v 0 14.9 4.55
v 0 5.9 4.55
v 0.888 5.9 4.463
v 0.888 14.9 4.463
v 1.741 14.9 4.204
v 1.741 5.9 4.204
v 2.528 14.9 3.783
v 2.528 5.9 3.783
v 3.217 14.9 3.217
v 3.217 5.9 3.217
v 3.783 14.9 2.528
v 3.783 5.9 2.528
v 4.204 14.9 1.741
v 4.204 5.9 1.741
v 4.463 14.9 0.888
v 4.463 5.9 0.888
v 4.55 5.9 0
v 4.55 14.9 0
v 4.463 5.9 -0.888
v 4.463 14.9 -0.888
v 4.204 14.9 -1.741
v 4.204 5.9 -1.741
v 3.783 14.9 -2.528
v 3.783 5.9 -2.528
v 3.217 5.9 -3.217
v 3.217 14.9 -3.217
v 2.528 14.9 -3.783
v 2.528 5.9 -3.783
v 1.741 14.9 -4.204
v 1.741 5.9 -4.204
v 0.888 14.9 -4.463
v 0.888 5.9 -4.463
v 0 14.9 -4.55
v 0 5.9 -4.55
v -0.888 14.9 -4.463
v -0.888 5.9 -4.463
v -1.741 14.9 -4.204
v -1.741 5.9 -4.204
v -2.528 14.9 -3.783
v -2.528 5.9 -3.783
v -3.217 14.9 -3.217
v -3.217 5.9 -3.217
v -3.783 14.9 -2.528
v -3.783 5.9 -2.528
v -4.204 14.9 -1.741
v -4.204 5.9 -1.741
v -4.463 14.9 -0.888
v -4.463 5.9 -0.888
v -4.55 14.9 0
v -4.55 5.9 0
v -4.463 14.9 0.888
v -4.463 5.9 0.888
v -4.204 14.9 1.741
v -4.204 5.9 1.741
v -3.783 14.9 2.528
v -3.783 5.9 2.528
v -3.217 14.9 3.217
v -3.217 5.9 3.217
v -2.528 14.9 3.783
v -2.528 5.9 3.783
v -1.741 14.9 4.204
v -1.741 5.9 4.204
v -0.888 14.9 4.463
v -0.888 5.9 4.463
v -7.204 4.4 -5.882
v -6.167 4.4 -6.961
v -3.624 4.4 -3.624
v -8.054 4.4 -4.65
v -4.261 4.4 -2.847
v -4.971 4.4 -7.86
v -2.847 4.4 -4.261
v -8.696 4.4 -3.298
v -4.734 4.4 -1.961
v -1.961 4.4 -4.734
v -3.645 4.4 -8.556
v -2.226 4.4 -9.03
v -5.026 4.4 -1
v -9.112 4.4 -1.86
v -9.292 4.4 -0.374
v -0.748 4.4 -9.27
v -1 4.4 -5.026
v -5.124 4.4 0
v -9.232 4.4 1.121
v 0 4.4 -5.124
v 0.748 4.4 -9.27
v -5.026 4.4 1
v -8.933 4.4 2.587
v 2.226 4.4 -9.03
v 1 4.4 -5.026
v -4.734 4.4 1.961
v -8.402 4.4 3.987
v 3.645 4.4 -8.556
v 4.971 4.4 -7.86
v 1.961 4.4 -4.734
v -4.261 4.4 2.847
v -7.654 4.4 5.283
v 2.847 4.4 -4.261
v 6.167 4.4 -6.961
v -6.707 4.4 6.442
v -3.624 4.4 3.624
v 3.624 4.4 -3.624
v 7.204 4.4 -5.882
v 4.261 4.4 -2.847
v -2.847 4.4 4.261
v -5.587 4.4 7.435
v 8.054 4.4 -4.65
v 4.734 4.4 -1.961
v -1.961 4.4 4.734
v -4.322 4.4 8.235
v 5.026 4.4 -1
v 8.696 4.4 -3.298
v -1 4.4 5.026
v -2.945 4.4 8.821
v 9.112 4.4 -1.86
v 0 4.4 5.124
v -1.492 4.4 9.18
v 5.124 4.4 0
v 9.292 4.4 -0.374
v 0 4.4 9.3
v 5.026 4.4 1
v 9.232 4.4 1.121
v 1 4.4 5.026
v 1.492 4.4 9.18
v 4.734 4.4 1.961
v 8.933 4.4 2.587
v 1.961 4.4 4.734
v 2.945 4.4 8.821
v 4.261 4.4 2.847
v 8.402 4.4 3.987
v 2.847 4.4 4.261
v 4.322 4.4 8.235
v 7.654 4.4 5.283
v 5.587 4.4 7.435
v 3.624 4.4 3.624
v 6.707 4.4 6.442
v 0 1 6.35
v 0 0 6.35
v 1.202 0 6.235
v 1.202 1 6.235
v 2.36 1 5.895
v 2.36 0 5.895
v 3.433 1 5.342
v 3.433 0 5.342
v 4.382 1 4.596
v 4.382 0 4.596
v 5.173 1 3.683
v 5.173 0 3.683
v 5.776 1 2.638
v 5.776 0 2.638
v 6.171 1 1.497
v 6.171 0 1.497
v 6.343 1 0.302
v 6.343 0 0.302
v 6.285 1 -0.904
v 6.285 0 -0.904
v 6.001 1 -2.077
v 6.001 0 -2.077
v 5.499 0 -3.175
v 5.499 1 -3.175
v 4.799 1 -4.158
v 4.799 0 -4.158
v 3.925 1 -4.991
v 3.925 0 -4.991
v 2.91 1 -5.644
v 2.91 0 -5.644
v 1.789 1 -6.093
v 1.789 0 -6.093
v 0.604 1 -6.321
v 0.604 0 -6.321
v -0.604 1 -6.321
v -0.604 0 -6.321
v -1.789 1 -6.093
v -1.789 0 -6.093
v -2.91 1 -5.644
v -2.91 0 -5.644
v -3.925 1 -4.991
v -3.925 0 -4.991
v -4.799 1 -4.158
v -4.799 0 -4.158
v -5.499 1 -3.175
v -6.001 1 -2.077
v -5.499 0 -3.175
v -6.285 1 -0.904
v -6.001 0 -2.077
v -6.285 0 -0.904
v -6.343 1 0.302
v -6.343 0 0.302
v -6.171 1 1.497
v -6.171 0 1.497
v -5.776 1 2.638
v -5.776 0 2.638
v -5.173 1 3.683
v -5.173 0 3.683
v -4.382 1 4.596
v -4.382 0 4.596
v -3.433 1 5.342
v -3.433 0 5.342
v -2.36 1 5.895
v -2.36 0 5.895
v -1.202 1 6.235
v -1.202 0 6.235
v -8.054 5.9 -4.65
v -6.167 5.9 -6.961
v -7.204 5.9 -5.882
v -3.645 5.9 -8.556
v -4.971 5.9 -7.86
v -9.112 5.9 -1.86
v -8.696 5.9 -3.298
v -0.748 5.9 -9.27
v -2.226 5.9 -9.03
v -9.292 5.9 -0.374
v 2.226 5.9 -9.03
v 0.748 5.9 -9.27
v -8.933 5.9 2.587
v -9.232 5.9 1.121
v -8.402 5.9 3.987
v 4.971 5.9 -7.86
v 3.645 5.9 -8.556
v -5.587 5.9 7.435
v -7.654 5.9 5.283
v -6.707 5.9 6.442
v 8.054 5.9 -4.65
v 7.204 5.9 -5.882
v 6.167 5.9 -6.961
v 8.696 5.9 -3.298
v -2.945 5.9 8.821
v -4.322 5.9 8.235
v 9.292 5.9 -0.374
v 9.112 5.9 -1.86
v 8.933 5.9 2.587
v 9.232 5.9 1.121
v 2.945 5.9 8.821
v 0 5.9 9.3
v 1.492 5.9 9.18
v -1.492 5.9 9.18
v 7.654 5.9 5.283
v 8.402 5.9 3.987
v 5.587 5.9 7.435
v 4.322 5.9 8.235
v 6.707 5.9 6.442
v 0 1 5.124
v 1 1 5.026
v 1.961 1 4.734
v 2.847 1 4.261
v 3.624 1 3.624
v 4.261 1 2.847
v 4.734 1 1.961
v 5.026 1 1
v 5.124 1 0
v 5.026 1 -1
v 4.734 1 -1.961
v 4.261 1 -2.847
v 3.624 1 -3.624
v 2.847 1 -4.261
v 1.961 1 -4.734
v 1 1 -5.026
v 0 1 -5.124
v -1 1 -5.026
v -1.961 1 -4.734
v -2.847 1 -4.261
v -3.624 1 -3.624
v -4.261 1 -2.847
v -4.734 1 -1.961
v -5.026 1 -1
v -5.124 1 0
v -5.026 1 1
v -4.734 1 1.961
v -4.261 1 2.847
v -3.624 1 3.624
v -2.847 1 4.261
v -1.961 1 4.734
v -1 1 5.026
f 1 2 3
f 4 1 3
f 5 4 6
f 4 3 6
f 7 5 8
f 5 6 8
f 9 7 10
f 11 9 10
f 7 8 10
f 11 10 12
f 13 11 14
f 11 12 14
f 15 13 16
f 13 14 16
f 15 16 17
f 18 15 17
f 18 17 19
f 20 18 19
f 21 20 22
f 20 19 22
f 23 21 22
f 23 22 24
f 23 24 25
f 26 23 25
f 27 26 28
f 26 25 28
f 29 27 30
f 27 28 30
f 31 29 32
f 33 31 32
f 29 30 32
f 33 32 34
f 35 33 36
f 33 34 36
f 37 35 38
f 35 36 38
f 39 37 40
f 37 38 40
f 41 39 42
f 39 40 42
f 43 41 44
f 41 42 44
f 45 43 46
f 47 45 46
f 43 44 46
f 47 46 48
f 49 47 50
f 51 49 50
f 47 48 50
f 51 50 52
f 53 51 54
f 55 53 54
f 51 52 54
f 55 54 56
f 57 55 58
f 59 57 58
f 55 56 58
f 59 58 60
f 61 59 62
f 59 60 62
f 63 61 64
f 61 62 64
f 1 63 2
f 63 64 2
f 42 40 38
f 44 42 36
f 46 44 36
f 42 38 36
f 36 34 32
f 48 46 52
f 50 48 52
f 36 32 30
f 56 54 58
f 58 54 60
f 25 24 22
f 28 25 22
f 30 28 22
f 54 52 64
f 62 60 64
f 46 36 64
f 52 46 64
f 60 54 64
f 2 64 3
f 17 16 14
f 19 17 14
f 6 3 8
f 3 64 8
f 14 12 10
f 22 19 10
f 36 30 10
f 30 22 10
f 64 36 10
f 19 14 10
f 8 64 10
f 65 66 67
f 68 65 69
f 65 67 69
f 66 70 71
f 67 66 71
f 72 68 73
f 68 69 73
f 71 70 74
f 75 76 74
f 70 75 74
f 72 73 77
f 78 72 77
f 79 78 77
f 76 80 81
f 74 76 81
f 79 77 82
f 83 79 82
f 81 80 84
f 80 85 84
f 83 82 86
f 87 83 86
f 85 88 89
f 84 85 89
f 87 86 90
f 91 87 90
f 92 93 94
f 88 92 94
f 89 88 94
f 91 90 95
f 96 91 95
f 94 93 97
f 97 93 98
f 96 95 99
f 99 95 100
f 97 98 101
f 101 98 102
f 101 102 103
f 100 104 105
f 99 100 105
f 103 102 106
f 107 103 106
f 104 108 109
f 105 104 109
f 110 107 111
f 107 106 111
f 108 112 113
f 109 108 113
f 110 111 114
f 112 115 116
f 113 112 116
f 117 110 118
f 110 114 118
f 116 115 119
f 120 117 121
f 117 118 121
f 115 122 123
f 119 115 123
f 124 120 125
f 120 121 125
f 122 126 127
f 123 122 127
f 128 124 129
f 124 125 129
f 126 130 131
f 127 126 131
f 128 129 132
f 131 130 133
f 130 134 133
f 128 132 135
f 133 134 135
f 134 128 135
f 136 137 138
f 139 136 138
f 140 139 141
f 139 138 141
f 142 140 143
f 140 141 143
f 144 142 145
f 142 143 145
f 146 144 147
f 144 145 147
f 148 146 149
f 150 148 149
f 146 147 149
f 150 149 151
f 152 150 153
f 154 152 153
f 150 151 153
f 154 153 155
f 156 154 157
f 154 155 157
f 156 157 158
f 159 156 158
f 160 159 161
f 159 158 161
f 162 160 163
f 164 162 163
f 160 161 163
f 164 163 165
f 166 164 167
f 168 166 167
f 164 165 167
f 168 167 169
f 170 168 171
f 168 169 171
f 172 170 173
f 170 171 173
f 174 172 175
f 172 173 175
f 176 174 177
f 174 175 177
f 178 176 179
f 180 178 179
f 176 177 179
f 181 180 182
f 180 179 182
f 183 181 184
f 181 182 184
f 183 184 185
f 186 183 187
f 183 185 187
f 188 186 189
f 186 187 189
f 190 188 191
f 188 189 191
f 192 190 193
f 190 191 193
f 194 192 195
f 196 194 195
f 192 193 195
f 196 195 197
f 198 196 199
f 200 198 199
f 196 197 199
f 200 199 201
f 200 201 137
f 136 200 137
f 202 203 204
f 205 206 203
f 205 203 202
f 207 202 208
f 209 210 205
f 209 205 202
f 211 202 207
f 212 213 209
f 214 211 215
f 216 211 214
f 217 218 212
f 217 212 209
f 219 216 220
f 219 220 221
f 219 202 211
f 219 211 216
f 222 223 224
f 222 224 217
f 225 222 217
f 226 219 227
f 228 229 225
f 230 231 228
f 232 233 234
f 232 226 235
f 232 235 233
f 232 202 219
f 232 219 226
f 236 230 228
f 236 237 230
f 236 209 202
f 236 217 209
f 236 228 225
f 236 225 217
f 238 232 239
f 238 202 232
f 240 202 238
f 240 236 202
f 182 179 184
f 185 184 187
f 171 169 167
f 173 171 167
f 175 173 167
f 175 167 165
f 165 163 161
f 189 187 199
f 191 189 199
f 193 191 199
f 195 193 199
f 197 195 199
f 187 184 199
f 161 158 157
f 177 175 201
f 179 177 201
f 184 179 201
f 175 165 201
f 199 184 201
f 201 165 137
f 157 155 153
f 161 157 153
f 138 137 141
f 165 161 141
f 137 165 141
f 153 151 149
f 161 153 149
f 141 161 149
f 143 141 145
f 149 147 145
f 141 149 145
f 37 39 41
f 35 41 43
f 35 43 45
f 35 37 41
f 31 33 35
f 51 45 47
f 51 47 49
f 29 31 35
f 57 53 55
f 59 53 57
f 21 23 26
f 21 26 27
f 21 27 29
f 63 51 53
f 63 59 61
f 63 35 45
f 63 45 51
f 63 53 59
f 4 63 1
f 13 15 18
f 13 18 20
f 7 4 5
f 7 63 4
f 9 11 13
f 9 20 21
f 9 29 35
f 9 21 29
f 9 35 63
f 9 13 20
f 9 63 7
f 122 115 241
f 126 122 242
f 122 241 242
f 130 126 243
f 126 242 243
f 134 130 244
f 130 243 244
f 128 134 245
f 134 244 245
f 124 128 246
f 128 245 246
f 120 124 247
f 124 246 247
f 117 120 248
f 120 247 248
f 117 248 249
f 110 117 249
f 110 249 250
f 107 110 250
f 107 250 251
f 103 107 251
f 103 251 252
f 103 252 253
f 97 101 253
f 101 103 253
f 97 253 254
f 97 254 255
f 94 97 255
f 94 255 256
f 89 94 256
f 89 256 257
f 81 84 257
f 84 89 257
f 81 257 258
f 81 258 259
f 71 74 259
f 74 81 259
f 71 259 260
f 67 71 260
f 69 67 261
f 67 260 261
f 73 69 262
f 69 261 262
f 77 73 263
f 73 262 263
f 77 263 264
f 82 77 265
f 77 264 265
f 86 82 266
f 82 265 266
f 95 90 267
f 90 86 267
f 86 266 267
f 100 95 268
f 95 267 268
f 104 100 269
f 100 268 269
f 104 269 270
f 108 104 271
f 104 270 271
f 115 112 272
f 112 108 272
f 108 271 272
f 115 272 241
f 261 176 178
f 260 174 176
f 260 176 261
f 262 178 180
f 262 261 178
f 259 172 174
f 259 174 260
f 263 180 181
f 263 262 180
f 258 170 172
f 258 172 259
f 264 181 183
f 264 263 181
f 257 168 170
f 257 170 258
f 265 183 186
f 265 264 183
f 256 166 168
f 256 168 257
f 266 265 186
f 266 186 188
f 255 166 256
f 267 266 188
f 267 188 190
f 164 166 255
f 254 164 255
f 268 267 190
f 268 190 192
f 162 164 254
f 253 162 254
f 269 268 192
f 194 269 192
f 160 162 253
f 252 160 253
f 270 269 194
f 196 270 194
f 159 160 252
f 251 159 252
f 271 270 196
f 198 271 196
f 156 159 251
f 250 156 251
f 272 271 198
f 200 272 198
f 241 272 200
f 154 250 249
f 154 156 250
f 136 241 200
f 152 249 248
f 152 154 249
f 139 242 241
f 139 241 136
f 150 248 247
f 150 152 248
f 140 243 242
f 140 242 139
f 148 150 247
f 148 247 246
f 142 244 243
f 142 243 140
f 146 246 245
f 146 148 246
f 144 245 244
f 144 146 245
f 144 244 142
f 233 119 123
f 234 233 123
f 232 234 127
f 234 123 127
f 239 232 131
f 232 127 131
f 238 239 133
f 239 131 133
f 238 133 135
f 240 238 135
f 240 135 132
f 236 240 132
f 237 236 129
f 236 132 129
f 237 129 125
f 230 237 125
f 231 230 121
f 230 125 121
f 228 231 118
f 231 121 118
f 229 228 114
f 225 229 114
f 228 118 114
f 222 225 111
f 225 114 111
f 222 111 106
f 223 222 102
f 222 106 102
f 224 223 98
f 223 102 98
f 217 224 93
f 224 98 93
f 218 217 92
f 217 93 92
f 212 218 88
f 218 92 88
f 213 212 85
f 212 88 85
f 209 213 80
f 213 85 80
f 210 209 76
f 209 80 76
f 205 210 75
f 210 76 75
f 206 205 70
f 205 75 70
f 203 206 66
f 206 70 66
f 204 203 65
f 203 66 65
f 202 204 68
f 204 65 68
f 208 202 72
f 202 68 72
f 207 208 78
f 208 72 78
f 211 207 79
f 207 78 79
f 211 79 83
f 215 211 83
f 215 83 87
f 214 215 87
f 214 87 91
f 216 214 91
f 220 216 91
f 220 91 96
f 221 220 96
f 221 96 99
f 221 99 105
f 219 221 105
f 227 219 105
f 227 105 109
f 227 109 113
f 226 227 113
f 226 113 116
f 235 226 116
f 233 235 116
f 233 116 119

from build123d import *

# Parameters (mm, degrees)
SKETCH1_R           = 6.35
BOSS_EXTRUDE1_DEPTH = 1
SKETCH3_R           = 9.3
BOSS_EXTRUDE3_DEPTH = 1.5
SKETCH5_R           = 4.55
BOSS_EXTRUDE4_DEPTH = 9
BOSS_EXTRUDE5_REACH = 21.136
SKETCH2_R           = 5.12445119


with BuildPart() as part:
    # Sketch1 → Boss-Extrude1 (new body)
    with BuildSketch(Plane(origin=(0, 0, 0), x_dir=(1, 0, 0), z_dir=(0, 1, 0))):
        with Locations(Location((0, 0, 0), (0, 0, 270))):
            Circle(SKETCH1_R)
    extrude(amount=BOSS_EXTRUDE1_DEPTH)


with BuildPart() as body_2:
    # Sketch3 → Boss-Extrude3 (new body)
    with BuildSketch(Plane(origin=(0, 4.4, 0), x_dir=(1, 0, 0), z_dir=(0, 1, 0))):
        with Locations(Location((0, 0, 0), (0, 0, 270))):
            Circle(SKETCH3_R)
    extrude(amount=BOSS_EXTRUDE3_DEPTH)

    # Sketch2 → Boss-Extrude5 (add, up to next)
    with BuildSketch(Plane(origin=(0, 1, 0), x_dir=(1, 0, 0), z_dir=(0, 1, 0)), mode=Mode.PRIVATE) as boss_extrude5_sk1:
        with Locations(Location((0, 0, 0), (0, 0, 270))):
            Circle(SKETCH2_R)
    boss_extrude5_tool1 = extrude(boss_extrude5_sk1.sketch, amount=BOSS_EXTRUDE5_REACH, mode=Mode.PRIVATE) - body_2.part

    add(part.part)  # Boss-Extrude5 merges part
    add(boss_extrude5_tool1.solids().sort_by_distance((0, 1, 0))[0])


with BuildPart() as body_3:
    # Sketch5 → Boss-Extrude4 (new body)
    with BuildSketch(Plane(origin=(0, 5.9, 0), x_dir=(1, 0, 0), z_dir=(0, 1, 0))):
        with Locations(Location((0, 0, 0), (0, 0, 270))):
            Circle(SKETCH5_R)
    extrude(amount=BOSS_EXTRUDE4_DEPTH)


solid = Compound([body_2.part, body_3.part])
